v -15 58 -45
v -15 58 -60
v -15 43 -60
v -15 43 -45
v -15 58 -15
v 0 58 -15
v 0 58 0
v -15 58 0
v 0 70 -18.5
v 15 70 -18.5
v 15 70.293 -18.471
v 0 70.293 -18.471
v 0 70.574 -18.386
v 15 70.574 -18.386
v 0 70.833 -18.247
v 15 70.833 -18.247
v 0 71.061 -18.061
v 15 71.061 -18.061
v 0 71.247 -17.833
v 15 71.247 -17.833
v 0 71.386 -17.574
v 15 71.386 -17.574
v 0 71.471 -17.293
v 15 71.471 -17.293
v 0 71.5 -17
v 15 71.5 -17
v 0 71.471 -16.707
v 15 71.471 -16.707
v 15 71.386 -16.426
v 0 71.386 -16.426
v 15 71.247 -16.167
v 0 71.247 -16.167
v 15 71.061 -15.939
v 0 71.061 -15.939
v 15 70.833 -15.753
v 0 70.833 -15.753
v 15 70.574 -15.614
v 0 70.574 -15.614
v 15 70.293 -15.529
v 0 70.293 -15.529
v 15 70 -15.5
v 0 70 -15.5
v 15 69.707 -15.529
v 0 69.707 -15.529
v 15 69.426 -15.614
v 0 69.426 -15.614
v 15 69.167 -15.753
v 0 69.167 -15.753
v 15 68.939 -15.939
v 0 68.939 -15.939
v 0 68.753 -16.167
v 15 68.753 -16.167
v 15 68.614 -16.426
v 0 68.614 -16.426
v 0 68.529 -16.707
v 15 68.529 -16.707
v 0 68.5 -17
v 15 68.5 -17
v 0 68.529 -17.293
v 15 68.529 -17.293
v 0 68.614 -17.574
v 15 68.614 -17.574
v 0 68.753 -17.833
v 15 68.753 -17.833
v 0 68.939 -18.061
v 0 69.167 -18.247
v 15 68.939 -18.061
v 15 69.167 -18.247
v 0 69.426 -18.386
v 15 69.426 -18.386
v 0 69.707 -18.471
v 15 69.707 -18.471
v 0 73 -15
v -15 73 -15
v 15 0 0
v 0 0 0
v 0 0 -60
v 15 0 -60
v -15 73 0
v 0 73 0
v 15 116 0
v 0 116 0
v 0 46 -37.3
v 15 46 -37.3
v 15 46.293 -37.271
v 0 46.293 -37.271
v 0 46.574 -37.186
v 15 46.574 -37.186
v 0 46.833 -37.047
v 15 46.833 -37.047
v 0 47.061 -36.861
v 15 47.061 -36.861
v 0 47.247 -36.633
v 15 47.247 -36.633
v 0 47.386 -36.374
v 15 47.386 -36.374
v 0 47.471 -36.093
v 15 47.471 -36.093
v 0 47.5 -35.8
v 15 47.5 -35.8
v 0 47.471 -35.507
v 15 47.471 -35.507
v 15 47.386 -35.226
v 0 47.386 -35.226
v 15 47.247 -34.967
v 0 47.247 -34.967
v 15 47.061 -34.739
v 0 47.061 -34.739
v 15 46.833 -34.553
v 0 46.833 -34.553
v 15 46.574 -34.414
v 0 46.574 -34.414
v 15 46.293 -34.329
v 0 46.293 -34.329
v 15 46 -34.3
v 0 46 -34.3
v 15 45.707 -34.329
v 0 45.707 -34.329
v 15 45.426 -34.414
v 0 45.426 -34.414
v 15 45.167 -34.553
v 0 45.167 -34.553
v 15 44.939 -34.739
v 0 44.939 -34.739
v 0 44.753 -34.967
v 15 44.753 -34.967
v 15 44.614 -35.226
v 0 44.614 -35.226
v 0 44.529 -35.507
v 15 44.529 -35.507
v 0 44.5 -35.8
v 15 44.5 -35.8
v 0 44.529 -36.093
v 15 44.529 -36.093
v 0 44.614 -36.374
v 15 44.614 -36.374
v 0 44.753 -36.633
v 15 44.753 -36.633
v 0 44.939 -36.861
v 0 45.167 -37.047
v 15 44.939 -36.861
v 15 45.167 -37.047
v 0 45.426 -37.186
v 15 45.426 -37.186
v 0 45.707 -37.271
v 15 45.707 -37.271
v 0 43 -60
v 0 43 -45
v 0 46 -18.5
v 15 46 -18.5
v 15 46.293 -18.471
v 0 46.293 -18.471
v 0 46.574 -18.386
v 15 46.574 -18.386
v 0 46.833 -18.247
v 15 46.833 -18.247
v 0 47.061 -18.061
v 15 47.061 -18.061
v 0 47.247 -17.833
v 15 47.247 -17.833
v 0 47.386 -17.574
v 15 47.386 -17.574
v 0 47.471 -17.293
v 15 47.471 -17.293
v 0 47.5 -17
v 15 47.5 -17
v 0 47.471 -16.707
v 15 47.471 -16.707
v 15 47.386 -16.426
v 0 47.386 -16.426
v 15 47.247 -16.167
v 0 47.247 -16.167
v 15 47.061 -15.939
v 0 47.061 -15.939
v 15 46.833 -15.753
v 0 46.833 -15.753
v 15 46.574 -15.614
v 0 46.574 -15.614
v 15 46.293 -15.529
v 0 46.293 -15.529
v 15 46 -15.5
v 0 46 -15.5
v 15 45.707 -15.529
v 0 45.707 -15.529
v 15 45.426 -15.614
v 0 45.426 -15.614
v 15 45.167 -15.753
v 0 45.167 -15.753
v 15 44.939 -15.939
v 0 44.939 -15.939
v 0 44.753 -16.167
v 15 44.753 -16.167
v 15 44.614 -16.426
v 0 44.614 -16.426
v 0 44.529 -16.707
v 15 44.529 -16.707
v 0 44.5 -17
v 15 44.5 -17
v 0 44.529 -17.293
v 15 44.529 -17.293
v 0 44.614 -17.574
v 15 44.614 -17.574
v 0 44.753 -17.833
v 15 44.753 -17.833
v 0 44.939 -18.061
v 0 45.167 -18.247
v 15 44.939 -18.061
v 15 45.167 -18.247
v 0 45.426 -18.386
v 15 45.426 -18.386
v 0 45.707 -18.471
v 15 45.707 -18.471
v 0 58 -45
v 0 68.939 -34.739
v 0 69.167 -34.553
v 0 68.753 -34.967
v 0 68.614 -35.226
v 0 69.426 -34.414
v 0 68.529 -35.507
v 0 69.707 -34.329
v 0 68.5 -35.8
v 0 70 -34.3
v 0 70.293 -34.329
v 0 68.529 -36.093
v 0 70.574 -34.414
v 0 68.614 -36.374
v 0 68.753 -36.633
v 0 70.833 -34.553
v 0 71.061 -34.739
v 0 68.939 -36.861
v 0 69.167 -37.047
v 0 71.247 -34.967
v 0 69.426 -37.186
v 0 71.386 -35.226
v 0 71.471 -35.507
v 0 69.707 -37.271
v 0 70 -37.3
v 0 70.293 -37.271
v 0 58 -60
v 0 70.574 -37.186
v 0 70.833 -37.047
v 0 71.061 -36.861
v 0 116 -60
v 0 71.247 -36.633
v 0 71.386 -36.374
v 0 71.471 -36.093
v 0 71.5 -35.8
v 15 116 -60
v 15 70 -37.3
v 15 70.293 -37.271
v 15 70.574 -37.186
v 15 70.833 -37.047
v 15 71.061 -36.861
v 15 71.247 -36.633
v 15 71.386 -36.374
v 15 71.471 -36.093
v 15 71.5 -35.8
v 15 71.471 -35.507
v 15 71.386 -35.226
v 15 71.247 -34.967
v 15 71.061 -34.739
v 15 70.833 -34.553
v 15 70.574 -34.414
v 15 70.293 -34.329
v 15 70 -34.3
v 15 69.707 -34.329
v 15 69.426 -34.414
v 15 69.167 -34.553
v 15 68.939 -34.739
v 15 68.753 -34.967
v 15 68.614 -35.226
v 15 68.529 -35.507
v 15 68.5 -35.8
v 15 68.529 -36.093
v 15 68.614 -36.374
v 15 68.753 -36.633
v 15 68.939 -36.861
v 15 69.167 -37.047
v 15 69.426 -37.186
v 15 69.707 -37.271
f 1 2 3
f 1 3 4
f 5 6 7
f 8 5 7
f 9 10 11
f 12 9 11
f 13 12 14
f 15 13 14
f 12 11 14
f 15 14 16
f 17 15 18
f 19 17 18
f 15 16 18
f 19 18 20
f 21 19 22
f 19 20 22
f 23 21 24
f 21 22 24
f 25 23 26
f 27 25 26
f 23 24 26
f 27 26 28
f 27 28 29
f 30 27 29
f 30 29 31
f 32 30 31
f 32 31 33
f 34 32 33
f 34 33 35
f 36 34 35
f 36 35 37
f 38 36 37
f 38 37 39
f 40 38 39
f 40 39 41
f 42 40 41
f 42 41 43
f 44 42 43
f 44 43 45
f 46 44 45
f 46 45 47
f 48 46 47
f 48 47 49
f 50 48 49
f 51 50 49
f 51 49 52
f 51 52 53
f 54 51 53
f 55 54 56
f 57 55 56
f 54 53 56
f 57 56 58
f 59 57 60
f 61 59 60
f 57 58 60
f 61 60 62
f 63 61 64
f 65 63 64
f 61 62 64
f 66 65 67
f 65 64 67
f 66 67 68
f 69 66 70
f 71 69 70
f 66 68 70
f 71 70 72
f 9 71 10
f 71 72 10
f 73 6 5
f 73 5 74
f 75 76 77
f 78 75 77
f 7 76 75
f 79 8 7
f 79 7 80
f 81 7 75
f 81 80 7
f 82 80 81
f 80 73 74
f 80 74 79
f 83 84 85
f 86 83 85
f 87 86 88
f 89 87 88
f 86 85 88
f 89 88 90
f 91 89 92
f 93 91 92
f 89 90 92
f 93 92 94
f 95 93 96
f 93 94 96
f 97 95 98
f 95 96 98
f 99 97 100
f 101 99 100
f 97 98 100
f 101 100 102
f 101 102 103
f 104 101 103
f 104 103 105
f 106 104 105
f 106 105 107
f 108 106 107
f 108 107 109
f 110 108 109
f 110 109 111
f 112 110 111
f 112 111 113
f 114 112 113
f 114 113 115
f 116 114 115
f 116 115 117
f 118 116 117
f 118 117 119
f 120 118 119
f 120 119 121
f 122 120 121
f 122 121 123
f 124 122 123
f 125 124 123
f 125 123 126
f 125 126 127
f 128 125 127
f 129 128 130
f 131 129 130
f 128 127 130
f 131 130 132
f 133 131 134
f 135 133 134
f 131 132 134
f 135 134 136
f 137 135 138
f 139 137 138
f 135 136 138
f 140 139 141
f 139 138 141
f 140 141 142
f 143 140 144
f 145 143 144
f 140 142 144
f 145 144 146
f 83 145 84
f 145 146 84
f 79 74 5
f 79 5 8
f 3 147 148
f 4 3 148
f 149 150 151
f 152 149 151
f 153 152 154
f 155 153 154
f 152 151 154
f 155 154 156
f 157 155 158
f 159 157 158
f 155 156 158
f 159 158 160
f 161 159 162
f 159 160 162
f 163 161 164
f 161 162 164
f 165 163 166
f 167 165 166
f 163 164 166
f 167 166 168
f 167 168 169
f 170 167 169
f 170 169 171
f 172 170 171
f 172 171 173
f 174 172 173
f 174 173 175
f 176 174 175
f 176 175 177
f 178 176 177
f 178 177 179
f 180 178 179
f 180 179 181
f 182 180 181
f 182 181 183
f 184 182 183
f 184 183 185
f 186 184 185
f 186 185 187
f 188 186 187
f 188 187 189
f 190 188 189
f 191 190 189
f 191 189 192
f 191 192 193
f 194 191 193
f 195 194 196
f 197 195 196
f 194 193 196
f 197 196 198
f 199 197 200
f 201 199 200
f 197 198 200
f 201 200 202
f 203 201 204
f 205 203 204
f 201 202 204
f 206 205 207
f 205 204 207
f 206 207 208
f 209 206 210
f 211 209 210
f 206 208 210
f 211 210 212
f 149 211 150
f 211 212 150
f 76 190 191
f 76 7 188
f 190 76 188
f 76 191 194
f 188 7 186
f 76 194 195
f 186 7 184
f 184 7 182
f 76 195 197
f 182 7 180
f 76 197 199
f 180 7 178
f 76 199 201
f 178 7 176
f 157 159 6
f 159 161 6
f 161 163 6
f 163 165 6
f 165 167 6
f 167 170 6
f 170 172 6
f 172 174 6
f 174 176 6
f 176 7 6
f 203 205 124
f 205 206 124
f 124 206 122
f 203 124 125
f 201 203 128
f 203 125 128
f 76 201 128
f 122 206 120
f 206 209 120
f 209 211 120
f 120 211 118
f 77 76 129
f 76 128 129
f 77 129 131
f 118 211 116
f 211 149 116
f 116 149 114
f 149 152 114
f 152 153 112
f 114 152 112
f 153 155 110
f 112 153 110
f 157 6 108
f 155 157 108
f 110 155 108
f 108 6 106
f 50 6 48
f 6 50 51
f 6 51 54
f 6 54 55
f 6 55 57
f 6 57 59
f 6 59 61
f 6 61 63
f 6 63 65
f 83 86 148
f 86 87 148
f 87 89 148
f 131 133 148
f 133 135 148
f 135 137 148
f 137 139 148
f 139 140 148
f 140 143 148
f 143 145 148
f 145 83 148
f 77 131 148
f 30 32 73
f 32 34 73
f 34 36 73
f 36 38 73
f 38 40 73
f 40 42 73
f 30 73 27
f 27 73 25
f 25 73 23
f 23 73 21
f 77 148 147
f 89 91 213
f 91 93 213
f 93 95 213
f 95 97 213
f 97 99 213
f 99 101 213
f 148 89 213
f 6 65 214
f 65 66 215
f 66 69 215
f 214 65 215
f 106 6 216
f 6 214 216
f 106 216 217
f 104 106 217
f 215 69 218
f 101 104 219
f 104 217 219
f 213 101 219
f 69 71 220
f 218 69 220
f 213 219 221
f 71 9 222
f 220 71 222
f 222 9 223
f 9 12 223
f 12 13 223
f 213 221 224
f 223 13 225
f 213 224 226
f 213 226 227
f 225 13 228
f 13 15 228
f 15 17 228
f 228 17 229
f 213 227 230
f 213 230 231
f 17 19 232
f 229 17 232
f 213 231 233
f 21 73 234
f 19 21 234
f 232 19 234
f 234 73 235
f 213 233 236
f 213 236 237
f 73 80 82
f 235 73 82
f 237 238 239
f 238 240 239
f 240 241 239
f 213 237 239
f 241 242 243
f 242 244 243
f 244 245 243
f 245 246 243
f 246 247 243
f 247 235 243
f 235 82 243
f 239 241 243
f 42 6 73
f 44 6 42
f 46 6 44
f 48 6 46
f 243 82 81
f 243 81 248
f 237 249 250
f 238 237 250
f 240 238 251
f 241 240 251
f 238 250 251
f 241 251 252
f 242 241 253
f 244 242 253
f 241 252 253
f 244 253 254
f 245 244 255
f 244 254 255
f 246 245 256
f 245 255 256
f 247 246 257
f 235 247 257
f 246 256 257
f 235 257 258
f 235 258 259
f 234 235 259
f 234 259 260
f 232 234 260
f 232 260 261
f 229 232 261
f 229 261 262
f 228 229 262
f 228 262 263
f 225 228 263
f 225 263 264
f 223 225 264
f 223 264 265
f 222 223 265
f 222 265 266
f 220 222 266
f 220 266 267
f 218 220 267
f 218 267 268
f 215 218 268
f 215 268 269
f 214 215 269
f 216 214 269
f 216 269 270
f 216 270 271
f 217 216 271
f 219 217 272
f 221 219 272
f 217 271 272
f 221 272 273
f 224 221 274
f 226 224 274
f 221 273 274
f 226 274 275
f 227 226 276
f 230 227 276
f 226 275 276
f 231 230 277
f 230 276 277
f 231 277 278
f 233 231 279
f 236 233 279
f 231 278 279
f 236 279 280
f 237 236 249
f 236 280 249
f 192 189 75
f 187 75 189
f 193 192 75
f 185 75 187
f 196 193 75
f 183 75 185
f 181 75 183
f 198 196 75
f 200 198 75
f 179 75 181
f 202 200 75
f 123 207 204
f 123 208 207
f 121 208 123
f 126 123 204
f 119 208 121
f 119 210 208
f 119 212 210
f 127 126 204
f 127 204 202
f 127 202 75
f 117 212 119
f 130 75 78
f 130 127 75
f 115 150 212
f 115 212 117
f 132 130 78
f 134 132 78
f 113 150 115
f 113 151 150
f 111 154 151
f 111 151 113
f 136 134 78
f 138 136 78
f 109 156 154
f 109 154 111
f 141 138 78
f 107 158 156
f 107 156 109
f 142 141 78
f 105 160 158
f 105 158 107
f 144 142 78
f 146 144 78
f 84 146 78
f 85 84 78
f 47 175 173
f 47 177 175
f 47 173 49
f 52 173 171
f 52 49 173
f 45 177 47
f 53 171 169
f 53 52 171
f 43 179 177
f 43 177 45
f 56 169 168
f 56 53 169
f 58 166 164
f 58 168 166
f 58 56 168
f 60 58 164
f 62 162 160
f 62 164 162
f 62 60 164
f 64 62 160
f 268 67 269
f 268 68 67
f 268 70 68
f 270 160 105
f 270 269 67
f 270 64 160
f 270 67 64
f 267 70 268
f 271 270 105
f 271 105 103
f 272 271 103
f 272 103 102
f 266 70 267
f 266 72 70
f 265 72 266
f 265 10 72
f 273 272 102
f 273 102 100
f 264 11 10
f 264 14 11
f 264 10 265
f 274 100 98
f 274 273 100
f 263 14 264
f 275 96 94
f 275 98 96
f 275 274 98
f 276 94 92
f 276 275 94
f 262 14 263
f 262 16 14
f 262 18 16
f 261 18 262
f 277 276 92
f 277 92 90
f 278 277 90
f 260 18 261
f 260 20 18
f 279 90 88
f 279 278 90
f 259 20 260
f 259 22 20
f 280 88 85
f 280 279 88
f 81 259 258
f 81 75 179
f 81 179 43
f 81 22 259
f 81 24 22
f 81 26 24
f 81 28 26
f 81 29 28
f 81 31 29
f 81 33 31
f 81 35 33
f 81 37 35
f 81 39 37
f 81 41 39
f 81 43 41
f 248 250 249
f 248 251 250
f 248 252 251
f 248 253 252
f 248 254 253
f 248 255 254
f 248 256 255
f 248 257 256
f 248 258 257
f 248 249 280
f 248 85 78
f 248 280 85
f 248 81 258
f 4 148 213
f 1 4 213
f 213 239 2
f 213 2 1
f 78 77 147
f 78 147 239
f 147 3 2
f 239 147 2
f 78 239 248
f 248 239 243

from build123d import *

# Parameters (mm, degrees)
CROQUIS1_W              = 60
CROQUIS1_H              = 116
SALIENTE_EXTRUIR1_DEPTH = 15
CROQUIS2_W              = 15
CROQUIS2_H              = 15
SALIENTE_EXTRUIR2_DEPTH = 15
CROQUIS3_R              = 1.5
CORTAR_EXTRUIR1_DEPTH   = 135


with BuildPart() as part:
    # Croquis1 → Saliente-Extruir1 (new body)
    with BuildSketch(Plane(origin=(0, 0, 0), x_dir=(0, 0, -1), z_dir=(1, 0, 0))):
        with Locations((30, 58)):
            Rectangle(CROQUIS1_W, CROQUIS1_H)
    extrude(amount=SALIENTE_EXTRUIR1_DEPTH)

    # Croquis2 → Saliente-Extruir2 (add)
    with BuildSketch(Plane.ZY):
        with Locations((-52.5, 50.5)):
            Rectangle(CROQUIS2_W, CROQUIS2_H)
        with Locations((-7.5, 65.5)):
            Rectangle(CROQUIS2_W, CROQUIS2_H)
    extrude(amount=SALIENTE_EXTRUIR2_DEPTH)

    # Croquis3 → Cortar-Extruir1 (cut, through all)
    with BuildSketch(Plane(origin=(15, 0, 0), x_dir=(0, 0, -1), z_dir=(1, 0, 0))):
        with Locations((17, 70)):
            Circle(CROQUIS3_R)
        with Locations((17, 46)):
            Circle(CROQUIS3_R)
        with Locations((35.8, 70)):
            Circle(CROQUIS3_R)
        with Locations((35.8, 46)):
            Circle(CROQUIS3_R)
    extrude(amount=-CORTAR_EXTRUIR1_DEPTH, mode=Mode.SUBTRACT)


solid = part.part
